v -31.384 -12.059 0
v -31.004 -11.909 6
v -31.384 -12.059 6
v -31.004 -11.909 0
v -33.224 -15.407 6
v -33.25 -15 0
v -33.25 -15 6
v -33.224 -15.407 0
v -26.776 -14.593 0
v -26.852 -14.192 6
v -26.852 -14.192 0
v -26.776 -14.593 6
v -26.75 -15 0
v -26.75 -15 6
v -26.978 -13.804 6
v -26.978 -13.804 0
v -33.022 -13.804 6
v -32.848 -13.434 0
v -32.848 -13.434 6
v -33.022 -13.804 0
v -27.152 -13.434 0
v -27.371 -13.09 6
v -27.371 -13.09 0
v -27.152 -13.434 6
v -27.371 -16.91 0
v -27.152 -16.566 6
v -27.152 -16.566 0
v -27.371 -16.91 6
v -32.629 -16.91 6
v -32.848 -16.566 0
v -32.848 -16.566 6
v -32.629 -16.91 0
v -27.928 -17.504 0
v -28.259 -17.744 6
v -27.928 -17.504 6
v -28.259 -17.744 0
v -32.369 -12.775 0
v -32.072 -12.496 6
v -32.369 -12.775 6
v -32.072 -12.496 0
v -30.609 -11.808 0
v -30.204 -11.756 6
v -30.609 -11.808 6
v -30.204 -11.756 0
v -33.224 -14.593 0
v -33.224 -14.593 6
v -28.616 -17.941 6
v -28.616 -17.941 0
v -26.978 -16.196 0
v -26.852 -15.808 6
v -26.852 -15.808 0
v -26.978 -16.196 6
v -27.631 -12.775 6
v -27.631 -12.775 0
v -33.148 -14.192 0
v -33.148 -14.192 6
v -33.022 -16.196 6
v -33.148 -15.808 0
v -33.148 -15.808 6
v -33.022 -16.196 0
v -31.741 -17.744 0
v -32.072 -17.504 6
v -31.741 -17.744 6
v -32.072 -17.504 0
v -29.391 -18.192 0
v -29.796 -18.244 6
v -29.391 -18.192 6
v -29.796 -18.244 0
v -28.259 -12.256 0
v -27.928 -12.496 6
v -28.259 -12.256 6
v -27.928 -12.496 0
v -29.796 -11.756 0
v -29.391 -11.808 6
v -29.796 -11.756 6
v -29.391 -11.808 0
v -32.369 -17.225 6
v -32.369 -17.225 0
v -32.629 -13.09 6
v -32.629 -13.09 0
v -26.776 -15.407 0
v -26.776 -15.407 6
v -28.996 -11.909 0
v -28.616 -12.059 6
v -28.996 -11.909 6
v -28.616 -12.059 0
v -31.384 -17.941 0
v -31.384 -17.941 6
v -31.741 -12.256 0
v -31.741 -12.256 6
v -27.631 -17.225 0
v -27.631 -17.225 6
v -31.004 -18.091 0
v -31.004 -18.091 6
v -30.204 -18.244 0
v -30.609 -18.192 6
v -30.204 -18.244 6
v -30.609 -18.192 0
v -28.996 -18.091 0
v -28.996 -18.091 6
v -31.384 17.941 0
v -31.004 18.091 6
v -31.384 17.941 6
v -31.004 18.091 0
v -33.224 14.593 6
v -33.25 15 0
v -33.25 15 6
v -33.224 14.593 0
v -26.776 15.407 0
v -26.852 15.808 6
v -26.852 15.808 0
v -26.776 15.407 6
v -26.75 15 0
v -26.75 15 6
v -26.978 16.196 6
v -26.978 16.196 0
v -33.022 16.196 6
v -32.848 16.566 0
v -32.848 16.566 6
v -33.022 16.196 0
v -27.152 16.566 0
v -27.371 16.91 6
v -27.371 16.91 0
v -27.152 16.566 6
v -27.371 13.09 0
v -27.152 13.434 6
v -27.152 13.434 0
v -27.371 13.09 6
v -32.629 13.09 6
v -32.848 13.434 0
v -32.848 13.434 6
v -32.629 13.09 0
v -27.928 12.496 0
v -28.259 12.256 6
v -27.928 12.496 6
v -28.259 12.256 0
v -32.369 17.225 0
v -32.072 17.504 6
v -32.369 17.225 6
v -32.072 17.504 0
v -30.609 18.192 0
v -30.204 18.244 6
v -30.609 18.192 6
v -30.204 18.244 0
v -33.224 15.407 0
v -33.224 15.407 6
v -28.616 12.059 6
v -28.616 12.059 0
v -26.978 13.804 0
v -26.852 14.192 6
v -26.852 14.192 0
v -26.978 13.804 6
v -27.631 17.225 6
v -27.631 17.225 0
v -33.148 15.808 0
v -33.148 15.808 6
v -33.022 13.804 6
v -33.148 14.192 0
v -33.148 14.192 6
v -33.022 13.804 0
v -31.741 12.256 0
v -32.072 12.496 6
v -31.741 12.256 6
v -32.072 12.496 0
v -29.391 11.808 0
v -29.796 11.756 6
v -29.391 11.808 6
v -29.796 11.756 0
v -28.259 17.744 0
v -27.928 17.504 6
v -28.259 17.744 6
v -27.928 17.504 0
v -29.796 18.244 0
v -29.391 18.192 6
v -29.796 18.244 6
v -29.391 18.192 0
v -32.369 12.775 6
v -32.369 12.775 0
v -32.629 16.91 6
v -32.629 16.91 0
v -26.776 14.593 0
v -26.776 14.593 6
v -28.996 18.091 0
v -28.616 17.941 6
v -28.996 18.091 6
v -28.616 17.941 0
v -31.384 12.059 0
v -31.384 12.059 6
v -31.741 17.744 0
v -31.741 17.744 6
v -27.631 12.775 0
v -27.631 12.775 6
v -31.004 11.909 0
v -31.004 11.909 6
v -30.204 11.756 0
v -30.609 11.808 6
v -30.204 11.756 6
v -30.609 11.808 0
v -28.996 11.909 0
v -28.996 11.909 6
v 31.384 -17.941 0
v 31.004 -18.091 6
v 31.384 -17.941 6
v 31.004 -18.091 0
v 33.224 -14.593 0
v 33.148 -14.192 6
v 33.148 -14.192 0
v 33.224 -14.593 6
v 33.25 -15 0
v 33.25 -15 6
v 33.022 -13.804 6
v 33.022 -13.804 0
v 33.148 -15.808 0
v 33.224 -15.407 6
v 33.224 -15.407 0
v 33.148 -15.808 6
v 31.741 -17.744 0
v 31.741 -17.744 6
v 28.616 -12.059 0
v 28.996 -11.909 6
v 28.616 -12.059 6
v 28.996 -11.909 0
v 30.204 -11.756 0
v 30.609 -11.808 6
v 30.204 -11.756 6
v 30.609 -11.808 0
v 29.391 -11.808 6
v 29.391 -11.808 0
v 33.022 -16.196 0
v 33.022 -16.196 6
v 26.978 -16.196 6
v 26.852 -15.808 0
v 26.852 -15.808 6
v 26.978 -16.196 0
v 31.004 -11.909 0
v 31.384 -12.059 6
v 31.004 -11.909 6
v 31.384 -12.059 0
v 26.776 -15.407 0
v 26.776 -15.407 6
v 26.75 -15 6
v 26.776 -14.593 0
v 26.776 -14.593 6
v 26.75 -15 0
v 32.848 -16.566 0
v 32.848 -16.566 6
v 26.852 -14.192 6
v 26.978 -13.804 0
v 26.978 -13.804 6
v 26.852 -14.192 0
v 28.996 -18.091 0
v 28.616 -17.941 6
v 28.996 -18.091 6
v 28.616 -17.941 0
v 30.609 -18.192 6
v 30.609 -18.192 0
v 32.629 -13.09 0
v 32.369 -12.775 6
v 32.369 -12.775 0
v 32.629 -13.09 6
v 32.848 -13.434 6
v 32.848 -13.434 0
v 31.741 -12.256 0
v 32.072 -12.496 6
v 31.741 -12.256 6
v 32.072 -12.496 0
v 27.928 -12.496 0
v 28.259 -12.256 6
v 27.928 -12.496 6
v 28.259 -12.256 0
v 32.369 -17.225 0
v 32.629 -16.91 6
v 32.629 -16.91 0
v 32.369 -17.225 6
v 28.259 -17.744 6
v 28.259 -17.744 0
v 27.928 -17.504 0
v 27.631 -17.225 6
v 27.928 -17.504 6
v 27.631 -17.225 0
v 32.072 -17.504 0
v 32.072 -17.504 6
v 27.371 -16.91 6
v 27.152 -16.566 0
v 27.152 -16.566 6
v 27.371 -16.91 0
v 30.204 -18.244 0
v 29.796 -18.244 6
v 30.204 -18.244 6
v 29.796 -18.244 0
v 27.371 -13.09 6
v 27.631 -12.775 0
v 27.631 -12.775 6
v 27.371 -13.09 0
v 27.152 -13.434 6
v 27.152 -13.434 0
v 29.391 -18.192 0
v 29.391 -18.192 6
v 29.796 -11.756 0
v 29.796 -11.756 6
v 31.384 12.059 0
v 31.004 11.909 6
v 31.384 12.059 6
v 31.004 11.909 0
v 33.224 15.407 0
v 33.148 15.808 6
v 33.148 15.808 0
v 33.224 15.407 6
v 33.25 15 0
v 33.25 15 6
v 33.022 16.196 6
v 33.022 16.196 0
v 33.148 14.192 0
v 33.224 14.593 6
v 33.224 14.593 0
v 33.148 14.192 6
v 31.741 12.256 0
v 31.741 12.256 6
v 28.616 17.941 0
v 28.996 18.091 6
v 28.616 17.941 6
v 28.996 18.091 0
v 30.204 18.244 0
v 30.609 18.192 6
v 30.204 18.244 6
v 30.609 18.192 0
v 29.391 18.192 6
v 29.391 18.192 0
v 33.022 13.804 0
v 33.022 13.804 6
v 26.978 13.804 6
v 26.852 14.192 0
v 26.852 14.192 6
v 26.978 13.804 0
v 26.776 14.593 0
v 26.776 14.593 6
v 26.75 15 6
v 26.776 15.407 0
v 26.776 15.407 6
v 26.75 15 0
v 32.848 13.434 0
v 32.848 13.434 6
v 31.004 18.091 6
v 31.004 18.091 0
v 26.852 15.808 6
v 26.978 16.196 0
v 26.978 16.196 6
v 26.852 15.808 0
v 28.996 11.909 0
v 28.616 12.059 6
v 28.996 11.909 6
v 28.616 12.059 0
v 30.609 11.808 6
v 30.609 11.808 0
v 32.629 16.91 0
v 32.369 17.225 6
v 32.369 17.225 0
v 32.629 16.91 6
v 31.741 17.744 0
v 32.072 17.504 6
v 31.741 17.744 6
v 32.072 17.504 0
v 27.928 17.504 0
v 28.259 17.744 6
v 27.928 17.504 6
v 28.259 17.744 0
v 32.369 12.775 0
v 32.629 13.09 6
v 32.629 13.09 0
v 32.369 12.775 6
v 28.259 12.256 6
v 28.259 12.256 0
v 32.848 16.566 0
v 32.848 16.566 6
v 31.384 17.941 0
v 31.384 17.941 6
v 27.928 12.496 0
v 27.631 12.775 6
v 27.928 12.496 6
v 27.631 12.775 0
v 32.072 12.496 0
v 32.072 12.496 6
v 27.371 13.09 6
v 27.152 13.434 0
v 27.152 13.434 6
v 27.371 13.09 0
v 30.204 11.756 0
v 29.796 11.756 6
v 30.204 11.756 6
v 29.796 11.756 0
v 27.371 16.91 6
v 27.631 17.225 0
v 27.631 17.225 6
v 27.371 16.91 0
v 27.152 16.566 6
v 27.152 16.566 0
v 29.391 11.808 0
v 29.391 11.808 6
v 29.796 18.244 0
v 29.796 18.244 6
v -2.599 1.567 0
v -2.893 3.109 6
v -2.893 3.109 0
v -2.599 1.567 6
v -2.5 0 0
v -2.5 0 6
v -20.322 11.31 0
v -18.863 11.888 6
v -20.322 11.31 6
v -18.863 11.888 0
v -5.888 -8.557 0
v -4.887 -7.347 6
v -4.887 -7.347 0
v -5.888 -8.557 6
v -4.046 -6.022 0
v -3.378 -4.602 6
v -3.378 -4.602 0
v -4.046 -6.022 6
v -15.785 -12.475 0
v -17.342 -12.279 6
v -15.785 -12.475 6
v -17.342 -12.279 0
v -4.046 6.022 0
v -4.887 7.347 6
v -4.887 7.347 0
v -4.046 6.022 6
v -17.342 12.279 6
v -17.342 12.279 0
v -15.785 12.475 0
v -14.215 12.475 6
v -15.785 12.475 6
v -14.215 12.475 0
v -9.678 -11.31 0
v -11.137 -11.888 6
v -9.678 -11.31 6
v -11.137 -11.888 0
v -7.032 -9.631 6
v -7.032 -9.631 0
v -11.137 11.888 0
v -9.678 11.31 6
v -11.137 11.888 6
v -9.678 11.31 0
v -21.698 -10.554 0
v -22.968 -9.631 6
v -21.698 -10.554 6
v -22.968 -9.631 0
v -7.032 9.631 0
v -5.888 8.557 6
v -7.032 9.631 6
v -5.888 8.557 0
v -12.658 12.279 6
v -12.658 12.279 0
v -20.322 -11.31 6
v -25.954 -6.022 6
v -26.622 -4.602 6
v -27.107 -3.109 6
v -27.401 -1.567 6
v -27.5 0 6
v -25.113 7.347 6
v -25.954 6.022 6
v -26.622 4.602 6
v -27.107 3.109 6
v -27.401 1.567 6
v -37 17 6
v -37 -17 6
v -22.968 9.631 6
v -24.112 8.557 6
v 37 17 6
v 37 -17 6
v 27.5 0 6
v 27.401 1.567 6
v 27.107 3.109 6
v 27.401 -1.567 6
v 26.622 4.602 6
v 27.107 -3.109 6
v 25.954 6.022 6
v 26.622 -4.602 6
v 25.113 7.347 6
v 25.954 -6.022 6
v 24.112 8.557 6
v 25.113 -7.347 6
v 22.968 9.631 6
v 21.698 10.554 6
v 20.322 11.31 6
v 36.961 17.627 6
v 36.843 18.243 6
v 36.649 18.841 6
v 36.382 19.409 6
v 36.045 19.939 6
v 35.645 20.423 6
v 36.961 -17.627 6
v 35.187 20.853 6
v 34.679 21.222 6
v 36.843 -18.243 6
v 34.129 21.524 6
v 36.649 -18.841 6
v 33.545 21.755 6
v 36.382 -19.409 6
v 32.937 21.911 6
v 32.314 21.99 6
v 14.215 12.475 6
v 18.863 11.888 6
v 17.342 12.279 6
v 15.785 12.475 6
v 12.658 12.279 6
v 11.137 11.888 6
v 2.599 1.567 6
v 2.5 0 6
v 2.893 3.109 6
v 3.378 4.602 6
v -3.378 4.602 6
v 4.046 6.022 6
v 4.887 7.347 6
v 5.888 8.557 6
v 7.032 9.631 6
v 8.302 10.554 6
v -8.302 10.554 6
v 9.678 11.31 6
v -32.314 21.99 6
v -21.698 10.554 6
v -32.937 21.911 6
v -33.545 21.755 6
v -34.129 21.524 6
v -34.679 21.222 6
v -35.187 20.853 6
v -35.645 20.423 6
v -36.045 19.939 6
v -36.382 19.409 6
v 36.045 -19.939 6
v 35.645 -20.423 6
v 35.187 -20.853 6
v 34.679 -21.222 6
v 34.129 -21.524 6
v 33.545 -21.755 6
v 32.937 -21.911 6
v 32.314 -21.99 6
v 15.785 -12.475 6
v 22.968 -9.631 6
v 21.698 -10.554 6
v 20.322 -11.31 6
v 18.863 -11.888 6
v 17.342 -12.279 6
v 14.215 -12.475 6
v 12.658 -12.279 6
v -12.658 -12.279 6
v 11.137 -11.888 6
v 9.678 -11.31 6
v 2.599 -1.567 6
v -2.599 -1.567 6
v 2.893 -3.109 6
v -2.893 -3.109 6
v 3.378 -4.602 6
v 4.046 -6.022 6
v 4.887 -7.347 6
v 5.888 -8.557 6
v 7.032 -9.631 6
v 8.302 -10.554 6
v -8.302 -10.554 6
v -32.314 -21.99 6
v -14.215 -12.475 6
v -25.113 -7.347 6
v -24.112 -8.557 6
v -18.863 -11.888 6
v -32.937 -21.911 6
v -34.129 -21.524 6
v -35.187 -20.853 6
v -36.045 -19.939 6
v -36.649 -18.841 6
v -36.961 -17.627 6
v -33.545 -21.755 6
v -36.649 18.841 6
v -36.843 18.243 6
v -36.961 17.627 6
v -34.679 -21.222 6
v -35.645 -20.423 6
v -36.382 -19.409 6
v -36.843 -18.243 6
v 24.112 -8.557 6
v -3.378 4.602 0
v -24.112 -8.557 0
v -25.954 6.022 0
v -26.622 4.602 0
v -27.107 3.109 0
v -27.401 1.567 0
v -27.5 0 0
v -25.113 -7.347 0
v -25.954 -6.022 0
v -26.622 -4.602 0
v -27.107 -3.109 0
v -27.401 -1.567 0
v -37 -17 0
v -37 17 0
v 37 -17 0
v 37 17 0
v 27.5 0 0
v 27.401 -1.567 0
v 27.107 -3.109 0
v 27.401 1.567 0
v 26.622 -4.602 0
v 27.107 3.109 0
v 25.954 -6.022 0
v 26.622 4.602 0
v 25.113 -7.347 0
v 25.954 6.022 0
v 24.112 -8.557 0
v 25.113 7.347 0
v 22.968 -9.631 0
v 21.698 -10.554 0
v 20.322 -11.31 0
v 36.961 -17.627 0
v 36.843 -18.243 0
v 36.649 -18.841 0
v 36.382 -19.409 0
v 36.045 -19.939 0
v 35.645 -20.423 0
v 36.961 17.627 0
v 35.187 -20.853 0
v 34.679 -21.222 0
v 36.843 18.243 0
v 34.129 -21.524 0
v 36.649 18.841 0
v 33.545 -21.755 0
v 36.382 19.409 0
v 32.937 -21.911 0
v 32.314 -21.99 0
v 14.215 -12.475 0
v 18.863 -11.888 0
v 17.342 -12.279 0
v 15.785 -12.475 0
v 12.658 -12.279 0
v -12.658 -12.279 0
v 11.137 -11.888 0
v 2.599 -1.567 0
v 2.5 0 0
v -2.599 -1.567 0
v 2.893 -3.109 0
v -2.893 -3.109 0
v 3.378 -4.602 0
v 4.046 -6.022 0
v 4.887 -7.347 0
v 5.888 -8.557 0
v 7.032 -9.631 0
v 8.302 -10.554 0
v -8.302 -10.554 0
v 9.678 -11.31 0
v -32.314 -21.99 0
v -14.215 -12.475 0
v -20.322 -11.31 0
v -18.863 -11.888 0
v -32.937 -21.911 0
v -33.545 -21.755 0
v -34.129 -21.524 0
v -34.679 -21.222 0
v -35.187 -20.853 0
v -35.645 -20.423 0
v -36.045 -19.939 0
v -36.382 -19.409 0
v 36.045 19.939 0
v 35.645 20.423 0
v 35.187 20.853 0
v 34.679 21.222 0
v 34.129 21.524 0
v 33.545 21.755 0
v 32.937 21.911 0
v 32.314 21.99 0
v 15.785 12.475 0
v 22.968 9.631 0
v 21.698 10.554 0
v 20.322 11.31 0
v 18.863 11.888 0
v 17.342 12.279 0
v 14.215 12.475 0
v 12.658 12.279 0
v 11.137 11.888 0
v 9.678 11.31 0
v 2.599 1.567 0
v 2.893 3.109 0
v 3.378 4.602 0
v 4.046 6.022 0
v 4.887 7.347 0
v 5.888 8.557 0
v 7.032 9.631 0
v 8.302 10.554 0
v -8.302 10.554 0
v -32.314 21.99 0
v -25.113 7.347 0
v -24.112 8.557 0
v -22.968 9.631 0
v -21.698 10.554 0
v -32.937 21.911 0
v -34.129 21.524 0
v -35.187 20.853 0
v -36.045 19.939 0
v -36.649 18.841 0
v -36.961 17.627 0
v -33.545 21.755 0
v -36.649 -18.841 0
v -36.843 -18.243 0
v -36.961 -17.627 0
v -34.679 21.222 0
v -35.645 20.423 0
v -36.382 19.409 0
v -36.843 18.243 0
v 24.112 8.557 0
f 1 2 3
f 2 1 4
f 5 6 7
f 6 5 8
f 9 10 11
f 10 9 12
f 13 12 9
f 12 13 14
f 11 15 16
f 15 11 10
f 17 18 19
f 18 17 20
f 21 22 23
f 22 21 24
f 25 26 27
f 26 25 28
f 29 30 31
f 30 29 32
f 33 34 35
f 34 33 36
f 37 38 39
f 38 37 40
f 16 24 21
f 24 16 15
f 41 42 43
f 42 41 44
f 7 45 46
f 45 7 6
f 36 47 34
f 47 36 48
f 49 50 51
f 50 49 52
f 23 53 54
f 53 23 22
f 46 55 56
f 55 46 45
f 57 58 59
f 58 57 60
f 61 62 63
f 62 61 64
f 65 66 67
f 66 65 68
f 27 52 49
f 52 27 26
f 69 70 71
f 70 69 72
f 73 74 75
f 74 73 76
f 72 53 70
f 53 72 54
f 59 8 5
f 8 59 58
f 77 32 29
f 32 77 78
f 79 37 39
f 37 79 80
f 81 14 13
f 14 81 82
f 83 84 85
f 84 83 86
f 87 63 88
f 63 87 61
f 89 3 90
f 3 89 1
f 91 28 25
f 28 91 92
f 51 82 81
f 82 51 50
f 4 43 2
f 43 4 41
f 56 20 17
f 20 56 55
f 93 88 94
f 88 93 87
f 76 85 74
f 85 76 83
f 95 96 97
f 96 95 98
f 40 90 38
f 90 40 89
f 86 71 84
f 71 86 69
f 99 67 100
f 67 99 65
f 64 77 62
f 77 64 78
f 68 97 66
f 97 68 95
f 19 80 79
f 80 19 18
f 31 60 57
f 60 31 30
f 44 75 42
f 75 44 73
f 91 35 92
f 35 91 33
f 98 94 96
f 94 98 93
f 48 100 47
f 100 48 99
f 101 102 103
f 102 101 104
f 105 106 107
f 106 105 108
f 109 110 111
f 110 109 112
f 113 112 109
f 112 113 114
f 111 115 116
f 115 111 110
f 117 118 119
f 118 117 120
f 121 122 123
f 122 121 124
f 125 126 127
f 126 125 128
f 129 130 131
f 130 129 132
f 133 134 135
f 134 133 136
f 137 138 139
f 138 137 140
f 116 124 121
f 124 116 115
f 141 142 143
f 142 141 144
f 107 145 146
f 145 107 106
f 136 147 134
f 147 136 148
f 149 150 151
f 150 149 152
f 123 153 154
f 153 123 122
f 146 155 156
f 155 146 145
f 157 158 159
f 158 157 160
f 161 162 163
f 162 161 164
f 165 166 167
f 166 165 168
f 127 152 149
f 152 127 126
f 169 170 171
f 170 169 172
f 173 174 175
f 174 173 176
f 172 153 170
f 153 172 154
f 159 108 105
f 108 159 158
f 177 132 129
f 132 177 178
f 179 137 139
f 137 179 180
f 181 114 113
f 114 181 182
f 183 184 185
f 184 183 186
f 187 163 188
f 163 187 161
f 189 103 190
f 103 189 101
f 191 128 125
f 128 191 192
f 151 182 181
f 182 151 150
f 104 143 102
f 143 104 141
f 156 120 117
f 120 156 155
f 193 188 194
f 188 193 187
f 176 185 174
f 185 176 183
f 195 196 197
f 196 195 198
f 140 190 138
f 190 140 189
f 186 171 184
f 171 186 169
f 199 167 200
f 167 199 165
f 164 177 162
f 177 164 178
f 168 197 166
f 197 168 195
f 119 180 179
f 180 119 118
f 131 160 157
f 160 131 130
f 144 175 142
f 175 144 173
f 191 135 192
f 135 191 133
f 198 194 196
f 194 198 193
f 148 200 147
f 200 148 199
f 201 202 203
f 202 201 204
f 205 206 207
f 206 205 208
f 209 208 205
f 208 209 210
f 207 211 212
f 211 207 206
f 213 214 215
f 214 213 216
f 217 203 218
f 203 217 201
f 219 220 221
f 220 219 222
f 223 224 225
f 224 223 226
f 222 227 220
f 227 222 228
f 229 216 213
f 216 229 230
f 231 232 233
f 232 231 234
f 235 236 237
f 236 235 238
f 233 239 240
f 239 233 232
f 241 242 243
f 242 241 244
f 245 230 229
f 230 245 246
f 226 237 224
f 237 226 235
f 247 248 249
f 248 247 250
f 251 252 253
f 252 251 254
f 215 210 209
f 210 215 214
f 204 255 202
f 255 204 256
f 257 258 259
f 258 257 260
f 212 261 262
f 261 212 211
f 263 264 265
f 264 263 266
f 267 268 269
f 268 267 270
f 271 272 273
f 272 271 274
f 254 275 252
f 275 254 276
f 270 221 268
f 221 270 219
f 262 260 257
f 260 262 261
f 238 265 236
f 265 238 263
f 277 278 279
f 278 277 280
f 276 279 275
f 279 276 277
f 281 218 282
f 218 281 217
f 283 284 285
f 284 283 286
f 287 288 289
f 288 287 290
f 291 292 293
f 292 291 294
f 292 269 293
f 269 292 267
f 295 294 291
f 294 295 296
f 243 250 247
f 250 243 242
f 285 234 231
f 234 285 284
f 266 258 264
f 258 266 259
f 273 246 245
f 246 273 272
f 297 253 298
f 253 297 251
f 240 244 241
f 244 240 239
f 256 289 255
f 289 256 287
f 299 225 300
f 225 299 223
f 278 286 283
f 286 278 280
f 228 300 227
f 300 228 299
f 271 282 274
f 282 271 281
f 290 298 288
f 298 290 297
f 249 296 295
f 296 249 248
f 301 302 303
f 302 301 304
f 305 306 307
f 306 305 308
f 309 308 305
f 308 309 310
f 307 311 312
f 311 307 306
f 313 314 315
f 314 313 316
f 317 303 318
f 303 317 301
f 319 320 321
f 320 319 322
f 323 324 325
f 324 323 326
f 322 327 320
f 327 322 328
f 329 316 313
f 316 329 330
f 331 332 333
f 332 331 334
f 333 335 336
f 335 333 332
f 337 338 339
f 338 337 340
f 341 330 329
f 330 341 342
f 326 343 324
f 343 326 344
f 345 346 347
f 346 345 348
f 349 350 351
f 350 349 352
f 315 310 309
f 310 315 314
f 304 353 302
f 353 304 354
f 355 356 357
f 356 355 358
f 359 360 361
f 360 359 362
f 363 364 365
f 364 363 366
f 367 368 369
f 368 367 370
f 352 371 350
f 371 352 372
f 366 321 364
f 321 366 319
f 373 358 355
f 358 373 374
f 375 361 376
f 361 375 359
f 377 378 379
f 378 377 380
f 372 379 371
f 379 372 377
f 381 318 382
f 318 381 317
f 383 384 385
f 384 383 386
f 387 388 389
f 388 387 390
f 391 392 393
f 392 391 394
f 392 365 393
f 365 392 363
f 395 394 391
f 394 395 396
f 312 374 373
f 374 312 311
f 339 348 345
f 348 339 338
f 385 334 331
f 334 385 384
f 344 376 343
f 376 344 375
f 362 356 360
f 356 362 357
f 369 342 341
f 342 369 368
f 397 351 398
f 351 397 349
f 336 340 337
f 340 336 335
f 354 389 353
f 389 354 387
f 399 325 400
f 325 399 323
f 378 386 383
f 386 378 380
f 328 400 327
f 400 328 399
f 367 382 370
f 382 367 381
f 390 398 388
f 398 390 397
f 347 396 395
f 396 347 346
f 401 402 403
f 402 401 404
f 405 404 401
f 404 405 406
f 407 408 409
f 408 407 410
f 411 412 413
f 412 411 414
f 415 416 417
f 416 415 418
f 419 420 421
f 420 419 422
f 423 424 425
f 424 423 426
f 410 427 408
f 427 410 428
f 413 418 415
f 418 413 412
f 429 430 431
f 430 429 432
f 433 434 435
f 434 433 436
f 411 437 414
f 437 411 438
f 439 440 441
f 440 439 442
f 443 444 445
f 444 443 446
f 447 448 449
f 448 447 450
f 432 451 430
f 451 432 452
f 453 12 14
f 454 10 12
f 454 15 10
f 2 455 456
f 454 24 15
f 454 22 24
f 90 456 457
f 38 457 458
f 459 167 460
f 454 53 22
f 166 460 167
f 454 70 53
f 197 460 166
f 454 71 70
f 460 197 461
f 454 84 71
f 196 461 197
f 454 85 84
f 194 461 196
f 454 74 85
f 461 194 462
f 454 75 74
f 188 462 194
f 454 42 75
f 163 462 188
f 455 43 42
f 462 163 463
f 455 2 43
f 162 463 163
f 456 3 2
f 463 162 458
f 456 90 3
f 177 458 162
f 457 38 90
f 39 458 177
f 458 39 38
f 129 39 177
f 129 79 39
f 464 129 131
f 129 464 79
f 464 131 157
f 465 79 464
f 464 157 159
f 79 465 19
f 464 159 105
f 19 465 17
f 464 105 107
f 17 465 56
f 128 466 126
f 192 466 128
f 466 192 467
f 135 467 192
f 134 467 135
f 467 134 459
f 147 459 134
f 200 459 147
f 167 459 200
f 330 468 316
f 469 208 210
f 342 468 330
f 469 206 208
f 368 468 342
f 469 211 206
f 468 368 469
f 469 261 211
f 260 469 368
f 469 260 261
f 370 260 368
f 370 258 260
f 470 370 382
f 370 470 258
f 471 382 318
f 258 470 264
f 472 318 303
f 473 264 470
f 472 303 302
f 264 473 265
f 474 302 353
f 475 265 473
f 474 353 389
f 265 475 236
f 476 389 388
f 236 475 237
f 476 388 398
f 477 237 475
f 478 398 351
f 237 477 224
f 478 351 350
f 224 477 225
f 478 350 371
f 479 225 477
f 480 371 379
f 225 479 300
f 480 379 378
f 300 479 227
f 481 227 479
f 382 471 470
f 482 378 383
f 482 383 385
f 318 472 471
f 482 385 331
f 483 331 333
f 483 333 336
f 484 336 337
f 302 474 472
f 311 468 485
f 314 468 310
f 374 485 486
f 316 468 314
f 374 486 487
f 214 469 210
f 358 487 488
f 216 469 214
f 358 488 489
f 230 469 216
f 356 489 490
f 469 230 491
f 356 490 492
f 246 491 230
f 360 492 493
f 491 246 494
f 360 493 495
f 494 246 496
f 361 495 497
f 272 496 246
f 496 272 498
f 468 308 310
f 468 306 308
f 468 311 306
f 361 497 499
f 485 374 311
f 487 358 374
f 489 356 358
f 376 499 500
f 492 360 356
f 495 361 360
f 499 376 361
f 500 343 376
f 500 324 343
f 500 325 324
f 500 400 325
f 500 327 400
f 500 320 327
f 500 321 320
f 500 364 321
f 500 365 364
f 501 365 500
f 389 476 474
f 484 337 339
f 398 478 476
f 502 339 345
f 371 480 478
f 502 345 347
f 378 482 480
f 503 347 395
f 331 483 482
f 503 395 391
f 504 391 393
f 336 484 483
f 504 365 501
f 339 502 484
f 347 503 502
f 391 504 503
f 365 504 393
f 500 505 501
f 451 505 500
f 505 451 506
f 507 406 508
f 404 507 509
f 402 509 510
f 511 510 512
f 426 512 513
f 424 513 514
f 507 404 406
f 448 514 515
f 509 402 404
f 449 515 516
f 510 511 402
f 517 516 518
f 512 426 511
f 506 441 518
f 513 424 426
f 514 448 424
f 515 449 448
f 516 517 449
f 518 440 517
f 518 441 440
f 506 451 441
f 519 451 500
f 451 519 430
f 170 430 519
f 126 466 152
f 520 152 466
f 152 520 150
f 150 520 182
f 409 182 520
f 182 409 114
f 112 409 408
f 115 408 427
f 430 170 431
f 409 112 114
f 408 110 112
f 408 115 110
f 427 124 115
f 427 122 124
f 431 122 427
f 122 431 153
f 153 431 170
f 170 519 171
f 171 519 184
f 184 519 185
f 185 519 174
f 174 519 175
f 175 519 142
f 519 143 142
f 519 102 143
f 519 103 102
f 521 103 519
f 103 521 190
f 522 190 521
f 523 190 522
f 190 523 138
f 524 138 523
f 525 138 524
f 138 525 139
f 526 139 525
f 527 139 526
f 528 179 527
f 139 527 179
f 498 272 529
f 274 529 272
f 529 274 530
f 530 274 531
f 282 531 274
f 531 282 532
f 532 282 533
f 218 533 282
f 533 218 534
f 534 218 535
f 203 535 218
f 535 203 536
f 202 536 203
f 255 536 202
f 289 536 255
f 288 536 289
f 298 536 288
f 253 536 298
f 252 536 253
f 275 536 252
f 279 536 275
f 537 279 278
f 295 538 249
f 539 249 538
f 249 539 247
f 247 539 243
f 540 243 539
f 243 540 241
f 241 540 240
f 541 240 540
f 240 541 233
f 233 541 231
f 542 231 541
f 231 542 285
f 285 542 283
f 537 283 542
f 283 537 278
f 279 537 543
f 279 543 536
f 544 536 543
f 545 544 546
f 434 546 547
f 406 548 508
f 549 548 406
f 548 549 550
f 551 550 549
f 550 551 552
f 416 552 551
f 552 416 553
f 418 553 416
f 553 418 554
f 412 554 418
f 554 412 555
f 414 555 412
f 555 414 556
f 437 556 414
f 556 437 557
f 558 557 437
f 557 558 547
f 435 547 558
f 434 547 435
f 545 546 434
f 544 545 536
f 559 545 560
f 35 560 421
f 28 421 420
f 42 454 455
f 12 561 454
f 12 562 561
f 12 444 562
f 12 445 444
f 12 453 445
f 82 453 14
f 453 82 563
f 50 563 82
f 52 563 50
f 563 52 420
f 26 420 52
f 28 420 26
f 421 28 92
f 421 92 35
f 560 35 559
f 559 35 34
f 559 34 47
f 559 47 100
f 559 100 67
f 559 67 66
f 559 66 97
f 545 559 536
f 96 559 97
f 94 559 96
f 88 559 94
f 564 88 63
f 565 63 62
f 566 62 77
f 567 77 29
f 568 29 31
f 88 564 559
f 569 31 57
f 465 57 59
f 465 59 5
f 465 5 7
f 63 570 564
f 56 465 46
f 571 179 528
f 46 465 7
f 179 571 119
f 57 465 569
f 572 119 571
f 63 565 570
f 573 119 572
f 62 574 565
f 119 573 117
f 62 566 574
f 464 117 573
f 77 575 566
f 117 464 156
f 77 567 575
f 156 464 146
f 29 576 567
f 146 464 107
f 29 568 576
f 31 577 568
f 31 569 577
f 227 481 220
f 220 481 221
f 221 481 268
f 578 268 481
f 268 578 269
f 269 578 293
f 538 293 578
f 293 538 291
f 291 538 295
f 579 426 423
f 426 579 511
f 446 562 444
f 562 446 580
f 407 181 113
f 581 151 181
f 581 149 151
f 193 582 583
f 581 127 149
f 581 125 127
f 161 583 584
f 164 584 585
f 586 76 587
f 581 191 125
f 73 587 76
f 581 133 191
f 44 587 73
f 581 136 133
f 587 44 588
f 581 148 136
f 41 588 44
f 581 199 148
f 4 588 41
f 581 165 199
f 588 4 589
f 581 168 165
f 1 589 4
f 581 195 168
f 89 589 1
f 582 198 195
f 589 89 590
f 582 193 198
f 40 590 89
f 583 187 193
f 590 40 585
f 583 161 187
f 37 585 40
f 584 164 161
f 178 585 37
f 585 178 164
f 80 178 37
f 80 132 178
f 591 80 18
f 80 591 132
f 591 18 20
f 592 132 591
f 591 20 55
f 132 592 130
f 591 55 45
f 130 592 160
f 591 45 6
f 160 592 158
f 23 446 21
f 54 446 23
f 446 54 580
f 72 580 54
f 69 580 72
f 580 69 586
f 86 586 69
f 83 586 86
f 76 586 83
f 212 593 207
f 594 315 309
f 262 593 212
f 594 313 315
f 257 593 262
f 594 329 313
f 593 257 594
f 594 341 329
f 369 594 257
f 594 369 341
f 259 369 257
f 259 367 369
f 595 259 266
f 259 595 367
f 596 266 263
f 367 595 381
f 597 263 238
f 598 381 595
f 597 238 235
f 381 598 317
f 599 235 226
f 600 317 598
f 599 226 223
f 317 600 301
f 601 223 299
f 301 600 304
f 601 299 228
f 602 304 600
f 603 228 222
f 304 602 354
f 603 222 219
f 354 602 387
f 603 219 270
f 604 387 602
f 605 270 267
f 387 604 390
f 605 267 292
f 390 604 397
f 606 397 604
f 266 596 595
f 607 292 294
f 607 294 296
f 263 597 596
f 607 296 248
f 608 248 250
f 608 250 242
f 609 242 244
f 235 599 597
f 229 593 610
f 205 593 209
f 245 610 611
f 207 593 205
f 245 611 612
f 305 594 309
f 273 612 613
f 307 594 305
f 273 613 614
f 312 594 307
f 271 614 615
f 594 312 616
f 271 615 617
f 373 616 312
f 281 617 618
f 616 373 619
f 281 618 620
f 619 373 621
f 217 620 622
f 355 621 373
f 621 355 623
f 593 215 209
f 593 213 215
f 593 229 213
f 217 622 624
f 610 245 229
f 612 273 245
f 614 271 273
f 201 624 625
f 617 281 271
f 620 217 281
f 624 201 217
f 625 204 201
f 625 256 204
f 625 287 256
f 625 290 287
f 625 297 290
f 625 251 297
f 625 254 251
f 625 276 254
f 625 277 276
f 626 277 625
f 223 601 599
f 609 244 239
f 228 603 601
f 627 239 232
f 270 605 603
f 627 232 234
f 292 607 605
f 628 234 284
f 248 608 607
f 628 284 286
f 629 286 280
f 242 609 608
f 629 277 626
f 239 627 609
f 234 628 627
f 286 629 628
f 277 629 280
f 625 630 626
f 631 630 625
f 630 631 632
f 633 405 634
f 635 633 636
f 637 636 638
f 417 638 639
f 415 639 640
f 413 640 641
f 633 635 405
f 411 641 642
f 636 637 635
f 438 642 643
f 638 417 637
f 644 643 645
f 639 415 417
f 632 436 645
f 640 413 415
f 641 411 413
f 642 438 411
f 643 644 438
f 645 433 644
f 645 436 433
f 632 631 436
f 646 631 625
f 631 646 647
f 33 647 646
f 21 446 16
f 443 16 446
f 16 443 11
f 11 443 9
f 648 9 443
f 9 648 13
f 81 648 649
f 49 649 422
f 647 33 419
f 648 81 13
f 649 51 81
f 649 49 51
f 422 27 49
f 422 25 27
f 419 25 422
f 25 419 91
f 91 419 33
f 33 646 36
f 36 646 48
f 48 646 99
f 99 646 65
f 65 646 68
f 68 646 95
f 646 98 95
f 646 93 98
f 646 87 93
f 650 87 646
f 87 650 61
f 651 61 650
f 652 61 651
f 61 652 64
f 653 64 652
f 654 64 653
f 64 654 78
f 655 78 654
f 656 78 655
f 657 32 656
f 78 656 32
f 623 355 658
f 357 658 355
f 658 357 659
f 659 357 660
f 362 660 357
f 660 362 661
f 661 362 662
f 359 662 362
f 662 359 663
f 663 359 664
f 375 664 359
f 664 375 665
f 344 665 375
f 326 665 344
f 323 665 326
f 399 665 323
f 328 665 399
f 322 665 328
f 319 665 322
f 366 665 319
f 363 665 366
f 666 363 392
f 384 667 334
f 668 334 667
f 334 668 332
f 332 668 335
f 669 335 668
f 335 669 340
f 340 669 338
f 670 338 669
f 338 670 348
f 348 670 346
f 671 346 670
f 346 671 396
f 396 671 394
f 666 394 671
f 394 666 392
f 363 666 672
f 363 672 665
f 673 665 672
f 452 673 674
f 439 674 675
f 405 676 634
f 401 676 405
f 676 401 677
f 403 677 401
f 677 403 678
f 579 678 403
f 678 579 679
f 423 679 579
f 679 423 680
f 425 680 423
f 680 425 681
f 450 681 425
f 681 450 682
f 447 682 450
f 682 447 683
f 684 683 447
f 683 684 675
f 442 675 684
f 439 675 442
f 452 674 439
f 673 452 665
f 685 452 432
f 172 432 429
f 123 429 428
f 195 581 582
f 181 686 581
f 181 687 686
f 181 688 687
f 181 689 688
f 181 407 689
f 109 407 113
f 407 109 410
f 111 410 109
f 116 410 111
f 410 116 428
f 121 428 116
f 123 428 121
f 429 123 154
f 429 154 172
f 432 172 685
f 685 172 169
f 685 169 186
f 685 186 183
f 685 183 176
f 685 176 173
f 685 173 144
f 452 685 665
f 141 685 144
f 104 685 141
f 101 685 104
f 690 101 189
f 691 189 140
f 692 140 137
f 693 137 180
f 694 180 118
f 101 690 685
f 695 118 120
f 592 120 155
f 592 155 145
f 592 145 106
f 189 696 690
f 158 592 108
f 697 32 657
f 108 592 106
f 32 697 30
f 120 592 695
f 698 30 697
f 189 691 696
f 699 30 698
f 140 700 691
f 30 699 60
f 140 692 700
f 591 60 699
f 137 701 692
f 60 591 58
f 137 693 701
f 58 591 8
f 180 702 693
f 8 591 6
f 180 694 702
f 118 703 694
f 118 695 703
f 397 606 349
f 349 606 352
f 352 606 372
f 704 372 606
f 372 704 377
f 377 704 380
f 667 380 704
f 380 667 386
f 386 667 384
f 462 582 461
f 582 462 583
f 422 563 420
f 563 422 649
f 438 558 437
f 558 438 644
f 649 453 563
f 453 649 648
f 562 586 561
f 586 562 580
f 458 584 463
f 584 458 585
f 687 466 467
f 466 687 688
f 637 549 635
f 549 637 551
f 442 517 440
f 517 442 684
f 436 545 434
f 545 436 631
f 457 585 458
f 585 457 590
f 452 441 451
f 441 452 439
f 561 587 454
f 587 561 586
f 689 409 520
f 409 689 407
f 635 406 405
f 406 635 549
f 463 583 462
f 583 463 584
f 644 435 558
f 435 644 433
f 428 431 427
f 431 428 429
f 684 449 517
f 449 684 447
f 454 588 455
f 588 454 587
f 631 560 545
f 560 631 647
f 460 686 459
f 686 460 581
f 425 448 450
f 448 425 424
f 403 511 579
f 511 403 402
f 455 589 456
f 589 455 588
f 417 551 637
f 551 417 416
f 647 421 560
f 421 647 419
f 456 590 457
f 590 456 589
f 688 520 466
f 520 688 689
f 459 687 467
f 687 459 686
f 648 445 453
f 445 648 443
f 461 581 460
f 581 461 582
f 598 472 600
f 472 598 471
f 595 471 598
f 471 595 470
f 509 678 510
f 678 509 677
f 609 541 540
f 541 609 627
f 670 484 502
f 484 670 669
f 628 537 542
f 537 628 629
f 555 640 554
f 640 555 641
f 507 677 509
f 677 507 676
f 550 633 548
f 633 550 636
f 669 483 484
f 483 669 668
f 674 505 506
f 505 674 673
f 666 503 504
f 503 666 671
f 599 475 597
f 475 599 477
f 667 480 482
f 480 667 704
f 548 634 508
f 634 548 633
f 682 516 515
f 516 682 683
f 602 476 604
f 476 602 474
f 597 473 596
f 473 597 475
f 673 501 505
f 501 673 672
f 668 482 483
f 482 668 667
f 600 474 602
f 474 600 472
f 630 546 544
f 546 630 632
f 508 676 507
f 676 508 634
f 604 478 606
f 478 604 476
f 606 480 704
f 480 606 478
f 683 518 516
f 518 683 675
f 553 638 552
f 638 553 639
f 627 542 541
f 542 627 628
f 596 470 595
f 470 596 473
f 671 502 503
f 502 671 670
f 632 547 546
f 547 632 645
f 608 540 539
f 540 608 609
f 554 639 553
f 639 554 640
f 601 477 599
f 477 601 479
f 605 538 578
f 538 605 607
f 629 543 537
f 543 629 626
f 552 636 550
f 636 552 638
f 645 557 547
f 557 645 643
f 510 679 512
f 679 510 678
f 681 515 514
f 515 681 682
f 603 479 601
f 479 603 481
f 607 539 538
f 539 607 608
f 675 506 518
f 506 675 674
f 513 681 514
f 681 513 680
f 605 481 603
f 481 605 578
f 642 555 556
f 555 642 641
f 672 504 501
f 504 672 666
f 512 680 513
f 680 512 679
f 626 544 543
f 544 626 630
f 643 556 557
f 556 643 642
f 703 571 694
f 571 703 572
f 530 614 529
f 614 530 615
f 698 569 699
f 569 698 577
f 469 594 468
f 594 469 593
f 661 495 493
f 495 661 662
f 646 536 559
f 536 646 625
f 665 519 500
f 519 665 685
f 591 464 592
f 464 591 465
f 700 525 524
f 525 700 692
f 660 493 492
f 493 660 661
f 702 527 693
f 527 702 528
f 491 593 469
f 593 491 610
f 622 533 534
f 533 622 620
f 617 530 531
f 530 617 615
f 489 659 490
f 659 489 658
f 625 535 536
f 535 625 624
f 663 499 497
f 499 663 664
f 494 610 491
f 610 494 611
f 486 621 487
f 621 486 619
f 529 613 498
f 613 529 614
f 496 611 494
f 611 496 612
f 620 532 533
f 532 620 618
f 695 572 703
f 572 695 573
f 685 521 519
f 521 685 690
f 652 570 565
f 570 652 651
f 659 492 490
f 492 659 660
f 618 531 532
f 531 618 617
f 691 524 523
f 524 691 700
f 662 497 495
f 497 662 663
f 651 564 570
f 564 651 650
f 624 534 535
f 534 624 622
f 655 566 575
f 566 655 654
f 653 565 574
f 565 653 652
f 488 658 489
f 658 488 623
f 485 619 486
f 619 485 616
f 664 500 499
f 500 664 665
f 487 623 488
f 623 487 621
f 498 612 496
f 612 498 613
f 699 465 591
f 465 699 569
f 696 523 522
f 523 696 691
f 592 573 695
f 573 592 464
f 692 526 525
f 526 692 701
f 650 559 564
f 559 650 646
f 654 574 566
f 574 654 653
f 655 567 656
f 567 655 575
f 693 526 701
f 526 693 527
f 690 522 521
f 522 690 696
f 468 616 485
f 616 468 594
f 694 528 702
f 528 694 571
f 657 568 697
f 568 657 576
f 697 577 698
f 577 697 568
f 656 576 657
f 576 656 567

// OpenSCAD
$fn = 50;

difference() {
	union() {
		hull() {
			translate(v = [-32.0, 17.0, 0]) {
				cylinder(h = 6, r = 5);
			}
			translate(v = [32.0, 17.0, 0]) {
				cylinder(h = 6, r = 5);
			}
			translate(v = [-32.0, -17.0, 0]) {
				cylinder(h = 6, r = 5);
			}
			translate(v = [32.0, -17.0, 0]) {
				cylinder(h = 6, r = 5);
			}
		}
	}
	union() {
		translate(v = [-30.0, -15.0, -100.0]) {
			cylinder(h = 200, r = 3.25);
		}
		translate(v = [-30.0, 15.0, -100.0]) {
			cylinder(h = 200, r = 3.25);
		}
		translate(v = [30.0, -15.0, -100.0]) {
			cylinder(h = 200, r = 3.25);
		}
		translate(v = [30.0, 15.0, -100.0]) {
			cylinder(h = 200, r = 3.25);
		}
		translate(v = [-30.0, -15.0, -100.0]) {
			cylinder(h = 200, r = 1.8);
		}
		translate(v = [-30.0, 15.0, -100.0]) {
			cylinder(h = 200, r = 1.8);
		}
		translate(v = [30.0, -15.0, -100.0]) {
			cylinder(h = 200, r = 1.8);
		}
		translate(v = [30.0, 15.0, -100.0]) {
			cylinder(h = 200, r = 1.8);
		}
		translate(v = [-15.0, 0, 0.0]) {
			cylinder(h = 6, r = 12.5);
		}
		translate(v = [15.0, 0, 0.0]) {
			cylinder(h = 6, r = 12.5);
		}
	}
}
